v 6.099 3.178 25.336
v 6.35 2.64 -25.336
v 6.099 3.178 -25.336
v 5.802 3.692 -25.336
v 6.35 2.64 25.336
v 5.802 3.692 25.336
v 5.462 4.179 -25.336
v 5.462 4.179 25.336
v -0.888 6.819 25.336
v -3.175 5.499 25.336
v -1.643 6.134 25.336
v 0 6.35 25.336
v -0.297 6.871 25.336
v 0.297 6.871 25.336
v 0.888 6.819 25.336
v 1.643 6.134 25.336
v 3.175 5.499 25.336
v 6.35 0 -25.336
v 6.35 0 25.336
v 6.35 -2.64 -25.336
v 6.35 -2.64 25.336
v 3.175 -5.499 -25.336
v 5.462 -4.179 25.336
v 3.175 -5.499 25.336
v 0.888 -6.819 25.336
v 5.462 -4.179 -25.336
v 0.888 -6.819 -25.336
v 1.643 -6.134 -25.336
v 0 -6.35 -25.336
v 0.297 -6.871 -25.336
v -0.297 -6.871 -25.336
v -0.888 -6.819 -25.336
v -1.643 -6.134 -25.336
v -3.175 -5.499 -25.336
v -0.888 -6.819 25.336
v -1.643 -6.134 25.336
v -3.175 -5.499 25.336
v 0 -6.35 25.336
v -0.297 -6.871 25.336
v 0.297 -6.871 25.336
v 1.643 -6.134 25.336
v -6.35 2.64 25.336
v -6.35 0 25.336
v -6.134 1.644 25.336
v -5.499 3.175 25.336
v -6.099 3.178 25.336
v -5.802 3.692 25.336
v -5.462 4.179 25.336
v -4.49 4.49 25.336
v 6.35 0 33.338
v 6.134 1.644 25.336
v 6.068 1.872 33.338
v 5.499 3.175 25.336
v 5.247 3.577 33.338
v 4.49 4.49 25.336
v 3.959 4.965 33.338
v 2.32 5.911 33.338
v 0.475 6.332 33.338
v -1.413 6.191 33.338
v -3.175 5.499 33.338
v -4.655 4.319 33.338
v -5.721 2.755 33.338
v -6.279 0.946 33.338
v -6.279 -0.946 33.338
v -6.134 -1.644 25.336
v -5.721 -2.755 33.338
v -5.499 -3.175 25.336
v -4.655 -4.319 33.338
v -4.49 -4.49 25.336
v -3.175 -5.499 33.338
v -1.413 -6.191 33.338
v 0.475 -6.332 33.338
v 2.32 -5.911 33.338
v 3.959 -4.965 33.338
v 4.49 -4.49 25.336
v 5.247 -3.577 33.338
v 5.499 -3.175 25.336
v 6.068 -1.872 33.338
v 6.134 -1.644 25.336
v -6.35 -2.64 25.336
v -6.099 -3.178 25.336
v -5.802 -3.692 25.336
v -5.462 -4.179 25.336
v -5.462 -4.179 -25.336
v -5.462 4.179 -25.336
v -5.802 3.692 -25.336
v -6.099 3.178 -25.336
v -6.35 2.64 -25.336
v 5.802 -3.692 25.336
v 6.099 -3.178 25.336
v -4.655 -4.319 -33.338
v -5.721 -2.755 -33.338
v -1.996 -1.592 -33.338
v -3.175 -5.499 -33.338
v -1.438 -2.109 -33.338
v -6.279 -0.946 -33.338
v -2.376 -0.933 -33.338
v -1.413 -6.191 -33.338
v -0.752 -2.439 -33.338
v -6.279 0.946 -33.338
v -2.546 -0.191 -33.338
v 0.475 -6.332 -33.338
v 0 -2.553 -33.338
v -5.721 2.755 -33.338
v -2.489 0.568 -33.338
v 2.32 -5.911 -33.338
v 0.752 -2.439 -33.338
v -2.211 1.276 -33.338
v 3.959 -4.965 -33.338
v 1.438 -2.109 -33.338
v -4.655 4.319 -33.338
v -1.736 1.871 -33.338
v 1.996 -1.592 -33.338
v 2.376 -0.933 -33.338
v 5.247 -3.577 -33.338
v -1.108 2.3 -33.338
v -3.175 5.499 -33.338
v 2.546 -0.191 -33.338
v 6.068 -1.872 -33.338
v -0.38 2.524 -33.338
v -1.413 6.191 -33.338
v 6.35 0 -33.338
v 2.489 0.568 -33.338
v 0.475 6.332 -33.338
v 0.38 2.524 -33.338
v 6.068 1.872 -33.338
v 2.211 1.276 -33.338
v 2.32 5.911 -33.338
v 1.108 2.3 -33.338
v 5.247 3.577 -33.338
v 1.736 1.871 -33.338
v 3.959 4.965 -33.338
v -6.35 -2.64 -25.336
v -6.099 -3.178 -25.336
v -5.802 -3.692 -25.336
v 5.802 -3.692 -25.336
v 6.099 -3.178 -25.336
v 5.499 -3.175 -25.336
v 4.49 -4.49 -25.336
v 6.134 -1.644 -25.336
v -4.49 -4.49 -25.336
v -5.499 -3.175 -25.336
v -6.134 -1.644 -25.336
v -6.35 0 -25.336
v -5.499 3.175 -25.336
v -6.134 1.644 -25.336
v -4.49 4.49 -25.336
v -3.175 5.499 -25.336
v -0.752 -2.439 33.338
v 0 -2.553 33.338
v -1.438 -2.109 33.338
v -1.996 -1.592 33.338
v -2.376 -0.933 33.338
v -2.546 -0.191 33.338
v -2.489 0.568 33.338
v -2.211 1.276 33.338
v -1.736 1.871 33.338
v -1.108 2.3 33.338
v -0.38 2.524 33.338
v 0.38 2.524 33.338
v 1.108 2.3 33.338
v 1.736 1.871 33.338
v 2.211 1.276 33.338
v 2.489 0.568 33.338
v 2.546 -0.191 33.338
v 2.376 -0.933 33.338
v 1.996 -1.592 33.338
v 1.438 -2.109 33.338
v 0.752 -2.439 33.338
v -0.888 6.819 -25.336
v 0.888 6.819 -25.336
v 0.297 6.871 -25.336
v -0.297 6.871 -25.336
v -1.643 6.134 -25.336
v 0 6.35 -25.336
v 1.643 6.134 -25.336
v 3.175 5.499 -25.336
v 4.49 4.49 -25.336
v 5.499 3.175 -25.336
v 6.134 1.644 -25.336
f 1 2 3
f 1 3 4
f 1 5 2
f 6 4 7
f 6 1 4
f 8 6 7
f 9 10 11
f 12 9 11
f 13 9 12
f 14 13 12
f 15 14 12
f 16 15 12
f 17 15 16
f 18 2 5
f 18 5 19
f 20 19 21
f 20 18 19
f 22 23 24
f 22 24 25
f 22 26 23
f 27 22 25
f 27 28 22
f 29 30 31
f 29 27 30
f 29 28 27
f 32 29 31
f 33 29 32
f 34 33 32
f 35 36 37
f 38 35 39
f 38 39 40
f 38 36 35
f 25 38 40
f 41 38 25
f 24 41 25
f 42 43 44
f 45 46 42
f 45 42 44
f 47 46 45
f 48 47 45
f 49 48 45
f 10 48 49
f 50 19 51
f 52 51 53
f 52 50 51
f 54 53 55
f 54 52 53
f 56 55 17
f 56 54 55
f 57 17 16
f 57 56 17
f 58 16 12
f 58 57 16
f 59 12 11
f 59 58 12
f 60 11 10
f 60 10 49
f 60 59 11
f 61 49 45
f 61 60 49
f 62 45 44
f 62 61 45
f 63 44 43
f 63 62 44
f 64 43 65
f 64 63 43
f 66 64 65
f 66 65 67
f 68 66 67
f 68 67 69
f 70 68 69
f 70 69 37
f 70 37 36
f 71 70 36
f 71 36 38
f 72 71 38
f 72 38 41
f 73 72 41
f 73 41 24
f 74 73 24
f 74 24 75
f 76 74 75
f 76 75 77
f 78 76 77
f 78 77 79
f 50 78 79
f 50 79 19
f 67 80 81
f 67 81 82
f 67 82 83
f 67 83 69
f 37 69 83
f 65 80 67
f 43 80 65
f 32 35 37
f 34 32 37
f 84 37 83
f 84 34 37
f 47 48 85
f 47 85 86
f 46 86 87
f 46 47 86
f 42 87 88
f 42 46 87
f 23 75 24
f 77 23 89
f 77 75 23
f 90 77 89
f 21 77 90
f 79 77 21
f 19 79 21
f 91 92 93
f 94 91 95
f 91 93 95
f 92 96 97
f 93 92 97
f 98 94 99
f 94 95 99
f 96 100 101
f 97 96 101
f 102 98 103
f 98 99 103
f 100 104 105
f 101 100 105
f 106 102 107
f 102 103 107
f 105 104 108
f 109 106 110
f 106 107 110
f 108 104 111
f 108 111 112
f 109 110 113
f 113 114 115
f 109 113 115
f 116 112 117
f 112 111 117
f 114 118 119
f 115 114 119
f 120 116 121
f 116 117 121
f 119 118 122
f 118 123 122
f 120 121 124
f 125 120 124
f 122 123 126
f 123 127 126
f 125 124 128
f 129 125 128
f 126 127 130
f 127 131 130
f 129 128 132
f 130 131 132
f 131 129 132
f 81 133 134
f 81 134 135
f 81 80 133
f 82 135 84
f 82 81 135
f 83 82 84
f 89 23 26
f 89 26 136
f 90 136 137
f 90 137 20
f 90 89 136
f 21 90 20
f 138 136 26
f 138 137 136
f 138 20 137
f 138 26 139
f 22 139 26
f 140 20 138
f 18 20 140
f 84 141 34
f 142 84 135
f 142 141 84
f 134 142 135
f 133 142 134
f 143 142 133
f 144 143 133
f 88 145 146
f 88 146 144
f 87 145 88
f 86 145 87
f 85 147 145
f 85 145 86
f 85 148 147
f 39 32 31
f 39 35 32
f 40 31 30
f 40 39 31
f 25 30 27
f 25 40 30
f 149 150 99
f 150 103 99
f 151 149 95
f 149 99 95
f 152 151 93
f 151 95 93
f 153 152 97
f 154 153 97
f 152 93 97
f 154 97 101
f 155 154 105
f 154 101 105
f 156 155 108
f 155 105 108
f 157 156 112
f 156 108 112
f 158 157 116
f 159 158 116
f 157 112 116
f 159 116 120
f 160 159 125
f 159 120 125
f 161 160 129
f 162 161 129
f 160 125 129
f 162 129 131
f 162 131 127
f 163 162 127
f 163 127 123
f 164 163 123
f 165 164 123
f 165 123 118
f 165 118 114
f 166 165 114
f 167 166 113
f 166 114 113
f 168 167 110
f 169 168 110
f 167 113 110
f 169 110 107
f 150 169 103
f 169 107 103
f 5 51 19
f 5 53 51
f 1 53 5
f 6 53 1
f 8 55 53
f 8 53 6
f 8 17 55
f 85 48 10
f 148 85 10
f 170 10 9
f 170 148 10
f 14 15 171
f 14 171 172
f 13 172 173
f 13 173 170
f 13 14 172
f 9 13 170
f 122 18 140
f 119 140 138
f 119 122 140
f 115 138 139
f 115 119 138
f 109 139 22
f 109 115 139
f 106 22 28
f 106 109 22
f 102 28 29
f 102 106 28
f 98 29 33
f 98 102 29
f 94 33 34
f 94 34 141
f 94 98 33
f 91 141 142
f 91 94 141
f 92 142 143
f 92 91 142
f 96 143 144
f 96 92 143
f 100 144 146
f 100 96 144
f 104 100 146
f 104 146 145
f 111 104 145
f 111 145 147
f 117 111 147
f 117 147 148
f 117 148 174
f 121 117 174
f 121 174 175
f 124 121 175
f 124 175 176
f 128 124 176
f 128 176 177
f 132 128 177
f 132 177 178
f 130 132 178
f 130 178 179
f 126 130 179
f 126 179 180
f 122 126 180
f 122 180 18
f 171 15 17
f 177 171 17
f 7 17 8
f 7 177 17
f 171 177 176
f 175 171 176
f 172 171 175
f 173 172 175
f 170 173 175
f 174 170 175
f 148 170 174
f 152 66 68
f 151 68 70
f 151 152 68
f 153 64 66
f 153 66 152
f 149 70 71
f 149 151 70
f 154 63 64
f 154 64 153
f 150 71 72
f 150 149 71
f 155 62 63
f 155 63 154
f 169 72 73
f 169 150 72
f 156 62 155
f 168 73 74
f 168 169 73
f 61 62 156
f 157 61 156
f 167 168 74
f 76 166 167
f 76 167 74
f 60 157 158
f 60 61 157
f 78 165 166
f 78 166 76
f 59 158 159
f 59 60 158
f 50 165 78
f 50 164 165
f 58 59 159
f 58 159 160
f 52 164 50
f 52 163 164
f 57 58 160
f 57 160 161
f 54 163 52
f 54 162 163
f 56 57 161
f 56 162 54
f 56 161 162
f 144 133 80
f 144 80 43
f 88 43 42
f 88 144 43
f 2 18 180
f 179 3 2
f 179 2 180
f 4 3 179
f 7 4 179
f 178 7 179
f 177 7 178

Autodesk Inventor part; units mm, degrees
ref_plane "YZ Plane" through (0, 0, 0) normal (1, 0, 0) x (0, 1, 0)
ref_plane "XZ Plane" through (0, 0, 0) normal (0, 1, 0) x (-1, 0, 0)
ref_plane "XY Plane" through (0, 0, 0) normal (0, 0, 1) x (1, 0, 0)
sketch "Sketch1" plane through (0, 0, 0) normal (0, 0, 1) x (1, 0, 0)
  line L0 (-6.35, -3.6662) -> (-6.35, 3.6662)
  line L1 (-6.35, 3.6662) -> (0, 7.3323)
  line L2 (0, 7.3323) -> (6.35, 3.6662)
  line L3 (6.35, 3.6662) -> (6.35, -3.6662)
  line L4 (6.35, -3.6662) -> (0, -7.3323)
  line L5 (0, -7.3323) -> (-6.35, -3.6662)
  point P0 (0, 0)
  point P1 (0, 0)
  dimension "Size" = 12.7
extrude "Extrusion1" add sketch "Sketch1" along normal mid plane 66.675
sketch "Sketch3" plane through (0, 0, 33.3375) normal (0, 0, 1) x (1, 0, 0)
  line L0 (-6.35, 3.6662) -> (0, 7.3323) construction
  line L1 (0, 7.3323) -> (6.35, 3.6662) construction
  line L2 (6.35, 3.6662) -> (6.35, -3.6662) construction
  line L3 (6.35, -3.6662) -> (0, -7.3323) construction
  line L4 (0, -7.3323) -> (-6.35, -3.6662) construction
  line L5 (-6.35, -3.6662) -> (-6.35, 3.6662) construction
  point P0 (0, 0)
hole "Hole1" at (0, 0, 33.3375) direction (0, 0, -1) diameter 5.1054 end through all
sketch "Sketch4" plane through (0, 0, 33.3375) normal (0, 0, 1) x (1, 0, 0)
  circle A0 centre (0, 0) radius 2.5527 construction
  line L0 (-6.35, 3.6662) -> (0, 7.3323) construction
  line L1 (0, 7.3323) -> (6.35, 3.6662) construction
  line L2 (6.35, 3.6662) -> (6.35, -3.6662) construction
  line L3 (6.35, -3.6662) -> (0, -7.3323) construction
  line L4 (0, -7.3323) -> (-6.35, -3.6662) construction
  line L5 (-6.35, -3.6662) -> (-6.35, 3.6662) construction
  circle A1 centre (0, 0) radius 6.8771
  circle A2 centre (0, 0) radius 8.89
  dimension "thunder" = 13.7541
  dimension "d16" = 17.78
extrude "Extrusion3" cut sketch "Sketch4" against normal through all
sketch "Sketch5" plane through (0, 0, 33.3375) normal (0, 0, 1) x (1, 0, 0)
  arc A0 (5.4616, -4.1791) -> (6.35, -2.6403) centre (0, 0) ccw projected
  line L0 (6.35, -2.6403) -> (6.35, 2.6403) projected
  arc A1 (6.35, 2.6403) -> (5.4616, 4.1791) centre (0, 0) ccw projected
  line L1 (5.4616, 4.1791) -> (0.8884, 6.8194) projected
  arc A2 (0.8884, 6.8194) -> (-0.8884, 6.8194) centre (0, 0) ccw projected
  line L2 (-0.8884, 6.8194) -> (-5.4616, 4.1791) projected
  arc A3 (-5.4616, 4.1791) -> (-6.35, 2.6403) centre (0, 0) ccw projected
  line L3 (-6.35, 2.6403) -> (-6.35, -2.6403) projected
  arc A4 (-6.35, -2.6403) -> (-5.4616, -4.1791) centre (0, 0) ccw projected
  line L4 (-5.4616, -4.1791) -> (-0.8884, -6.8194) projected
  arc A5 (-0.8884, -6.8194) -> (0.8884, -6.8194) centre (0, 0) ccw projected
  line L5 (0.8884, -6.8194) -> (5.4616, -4.1791) projected
  circle A6 centre (0, 0) radius 2.5527 projected
  circle A7 centre (0, 0) radius 6.35
  point P0 (3.175, -5.4993)
  point P1 (-3.175, -5.4993)
  point P2 (-6.35, 0)
  point P3 (-3.175, 5.4993)
  point P4 (3.175, 5.4993)
  point P5 (6.35, 0)
  dimension "d19" = 12.7
extrude "Extrusion4" cut sketch "Sketch5" against normal blind 8.001 contours L5 A7 L0 A0 | L5 A5 L4 A7 | A7 L1 A1 L0 | L4 A4 L3 A7 | A7 L2 A2 L1 | L3 A3 L2 A7
mirror "Mirror2" about plane through (0, 0, 0) normal (0, 0, 1) of "Extrusion4"
equation "\"bearing\" = 25.4"
properties part number "GP6-009" material "Aluminum 6061"
